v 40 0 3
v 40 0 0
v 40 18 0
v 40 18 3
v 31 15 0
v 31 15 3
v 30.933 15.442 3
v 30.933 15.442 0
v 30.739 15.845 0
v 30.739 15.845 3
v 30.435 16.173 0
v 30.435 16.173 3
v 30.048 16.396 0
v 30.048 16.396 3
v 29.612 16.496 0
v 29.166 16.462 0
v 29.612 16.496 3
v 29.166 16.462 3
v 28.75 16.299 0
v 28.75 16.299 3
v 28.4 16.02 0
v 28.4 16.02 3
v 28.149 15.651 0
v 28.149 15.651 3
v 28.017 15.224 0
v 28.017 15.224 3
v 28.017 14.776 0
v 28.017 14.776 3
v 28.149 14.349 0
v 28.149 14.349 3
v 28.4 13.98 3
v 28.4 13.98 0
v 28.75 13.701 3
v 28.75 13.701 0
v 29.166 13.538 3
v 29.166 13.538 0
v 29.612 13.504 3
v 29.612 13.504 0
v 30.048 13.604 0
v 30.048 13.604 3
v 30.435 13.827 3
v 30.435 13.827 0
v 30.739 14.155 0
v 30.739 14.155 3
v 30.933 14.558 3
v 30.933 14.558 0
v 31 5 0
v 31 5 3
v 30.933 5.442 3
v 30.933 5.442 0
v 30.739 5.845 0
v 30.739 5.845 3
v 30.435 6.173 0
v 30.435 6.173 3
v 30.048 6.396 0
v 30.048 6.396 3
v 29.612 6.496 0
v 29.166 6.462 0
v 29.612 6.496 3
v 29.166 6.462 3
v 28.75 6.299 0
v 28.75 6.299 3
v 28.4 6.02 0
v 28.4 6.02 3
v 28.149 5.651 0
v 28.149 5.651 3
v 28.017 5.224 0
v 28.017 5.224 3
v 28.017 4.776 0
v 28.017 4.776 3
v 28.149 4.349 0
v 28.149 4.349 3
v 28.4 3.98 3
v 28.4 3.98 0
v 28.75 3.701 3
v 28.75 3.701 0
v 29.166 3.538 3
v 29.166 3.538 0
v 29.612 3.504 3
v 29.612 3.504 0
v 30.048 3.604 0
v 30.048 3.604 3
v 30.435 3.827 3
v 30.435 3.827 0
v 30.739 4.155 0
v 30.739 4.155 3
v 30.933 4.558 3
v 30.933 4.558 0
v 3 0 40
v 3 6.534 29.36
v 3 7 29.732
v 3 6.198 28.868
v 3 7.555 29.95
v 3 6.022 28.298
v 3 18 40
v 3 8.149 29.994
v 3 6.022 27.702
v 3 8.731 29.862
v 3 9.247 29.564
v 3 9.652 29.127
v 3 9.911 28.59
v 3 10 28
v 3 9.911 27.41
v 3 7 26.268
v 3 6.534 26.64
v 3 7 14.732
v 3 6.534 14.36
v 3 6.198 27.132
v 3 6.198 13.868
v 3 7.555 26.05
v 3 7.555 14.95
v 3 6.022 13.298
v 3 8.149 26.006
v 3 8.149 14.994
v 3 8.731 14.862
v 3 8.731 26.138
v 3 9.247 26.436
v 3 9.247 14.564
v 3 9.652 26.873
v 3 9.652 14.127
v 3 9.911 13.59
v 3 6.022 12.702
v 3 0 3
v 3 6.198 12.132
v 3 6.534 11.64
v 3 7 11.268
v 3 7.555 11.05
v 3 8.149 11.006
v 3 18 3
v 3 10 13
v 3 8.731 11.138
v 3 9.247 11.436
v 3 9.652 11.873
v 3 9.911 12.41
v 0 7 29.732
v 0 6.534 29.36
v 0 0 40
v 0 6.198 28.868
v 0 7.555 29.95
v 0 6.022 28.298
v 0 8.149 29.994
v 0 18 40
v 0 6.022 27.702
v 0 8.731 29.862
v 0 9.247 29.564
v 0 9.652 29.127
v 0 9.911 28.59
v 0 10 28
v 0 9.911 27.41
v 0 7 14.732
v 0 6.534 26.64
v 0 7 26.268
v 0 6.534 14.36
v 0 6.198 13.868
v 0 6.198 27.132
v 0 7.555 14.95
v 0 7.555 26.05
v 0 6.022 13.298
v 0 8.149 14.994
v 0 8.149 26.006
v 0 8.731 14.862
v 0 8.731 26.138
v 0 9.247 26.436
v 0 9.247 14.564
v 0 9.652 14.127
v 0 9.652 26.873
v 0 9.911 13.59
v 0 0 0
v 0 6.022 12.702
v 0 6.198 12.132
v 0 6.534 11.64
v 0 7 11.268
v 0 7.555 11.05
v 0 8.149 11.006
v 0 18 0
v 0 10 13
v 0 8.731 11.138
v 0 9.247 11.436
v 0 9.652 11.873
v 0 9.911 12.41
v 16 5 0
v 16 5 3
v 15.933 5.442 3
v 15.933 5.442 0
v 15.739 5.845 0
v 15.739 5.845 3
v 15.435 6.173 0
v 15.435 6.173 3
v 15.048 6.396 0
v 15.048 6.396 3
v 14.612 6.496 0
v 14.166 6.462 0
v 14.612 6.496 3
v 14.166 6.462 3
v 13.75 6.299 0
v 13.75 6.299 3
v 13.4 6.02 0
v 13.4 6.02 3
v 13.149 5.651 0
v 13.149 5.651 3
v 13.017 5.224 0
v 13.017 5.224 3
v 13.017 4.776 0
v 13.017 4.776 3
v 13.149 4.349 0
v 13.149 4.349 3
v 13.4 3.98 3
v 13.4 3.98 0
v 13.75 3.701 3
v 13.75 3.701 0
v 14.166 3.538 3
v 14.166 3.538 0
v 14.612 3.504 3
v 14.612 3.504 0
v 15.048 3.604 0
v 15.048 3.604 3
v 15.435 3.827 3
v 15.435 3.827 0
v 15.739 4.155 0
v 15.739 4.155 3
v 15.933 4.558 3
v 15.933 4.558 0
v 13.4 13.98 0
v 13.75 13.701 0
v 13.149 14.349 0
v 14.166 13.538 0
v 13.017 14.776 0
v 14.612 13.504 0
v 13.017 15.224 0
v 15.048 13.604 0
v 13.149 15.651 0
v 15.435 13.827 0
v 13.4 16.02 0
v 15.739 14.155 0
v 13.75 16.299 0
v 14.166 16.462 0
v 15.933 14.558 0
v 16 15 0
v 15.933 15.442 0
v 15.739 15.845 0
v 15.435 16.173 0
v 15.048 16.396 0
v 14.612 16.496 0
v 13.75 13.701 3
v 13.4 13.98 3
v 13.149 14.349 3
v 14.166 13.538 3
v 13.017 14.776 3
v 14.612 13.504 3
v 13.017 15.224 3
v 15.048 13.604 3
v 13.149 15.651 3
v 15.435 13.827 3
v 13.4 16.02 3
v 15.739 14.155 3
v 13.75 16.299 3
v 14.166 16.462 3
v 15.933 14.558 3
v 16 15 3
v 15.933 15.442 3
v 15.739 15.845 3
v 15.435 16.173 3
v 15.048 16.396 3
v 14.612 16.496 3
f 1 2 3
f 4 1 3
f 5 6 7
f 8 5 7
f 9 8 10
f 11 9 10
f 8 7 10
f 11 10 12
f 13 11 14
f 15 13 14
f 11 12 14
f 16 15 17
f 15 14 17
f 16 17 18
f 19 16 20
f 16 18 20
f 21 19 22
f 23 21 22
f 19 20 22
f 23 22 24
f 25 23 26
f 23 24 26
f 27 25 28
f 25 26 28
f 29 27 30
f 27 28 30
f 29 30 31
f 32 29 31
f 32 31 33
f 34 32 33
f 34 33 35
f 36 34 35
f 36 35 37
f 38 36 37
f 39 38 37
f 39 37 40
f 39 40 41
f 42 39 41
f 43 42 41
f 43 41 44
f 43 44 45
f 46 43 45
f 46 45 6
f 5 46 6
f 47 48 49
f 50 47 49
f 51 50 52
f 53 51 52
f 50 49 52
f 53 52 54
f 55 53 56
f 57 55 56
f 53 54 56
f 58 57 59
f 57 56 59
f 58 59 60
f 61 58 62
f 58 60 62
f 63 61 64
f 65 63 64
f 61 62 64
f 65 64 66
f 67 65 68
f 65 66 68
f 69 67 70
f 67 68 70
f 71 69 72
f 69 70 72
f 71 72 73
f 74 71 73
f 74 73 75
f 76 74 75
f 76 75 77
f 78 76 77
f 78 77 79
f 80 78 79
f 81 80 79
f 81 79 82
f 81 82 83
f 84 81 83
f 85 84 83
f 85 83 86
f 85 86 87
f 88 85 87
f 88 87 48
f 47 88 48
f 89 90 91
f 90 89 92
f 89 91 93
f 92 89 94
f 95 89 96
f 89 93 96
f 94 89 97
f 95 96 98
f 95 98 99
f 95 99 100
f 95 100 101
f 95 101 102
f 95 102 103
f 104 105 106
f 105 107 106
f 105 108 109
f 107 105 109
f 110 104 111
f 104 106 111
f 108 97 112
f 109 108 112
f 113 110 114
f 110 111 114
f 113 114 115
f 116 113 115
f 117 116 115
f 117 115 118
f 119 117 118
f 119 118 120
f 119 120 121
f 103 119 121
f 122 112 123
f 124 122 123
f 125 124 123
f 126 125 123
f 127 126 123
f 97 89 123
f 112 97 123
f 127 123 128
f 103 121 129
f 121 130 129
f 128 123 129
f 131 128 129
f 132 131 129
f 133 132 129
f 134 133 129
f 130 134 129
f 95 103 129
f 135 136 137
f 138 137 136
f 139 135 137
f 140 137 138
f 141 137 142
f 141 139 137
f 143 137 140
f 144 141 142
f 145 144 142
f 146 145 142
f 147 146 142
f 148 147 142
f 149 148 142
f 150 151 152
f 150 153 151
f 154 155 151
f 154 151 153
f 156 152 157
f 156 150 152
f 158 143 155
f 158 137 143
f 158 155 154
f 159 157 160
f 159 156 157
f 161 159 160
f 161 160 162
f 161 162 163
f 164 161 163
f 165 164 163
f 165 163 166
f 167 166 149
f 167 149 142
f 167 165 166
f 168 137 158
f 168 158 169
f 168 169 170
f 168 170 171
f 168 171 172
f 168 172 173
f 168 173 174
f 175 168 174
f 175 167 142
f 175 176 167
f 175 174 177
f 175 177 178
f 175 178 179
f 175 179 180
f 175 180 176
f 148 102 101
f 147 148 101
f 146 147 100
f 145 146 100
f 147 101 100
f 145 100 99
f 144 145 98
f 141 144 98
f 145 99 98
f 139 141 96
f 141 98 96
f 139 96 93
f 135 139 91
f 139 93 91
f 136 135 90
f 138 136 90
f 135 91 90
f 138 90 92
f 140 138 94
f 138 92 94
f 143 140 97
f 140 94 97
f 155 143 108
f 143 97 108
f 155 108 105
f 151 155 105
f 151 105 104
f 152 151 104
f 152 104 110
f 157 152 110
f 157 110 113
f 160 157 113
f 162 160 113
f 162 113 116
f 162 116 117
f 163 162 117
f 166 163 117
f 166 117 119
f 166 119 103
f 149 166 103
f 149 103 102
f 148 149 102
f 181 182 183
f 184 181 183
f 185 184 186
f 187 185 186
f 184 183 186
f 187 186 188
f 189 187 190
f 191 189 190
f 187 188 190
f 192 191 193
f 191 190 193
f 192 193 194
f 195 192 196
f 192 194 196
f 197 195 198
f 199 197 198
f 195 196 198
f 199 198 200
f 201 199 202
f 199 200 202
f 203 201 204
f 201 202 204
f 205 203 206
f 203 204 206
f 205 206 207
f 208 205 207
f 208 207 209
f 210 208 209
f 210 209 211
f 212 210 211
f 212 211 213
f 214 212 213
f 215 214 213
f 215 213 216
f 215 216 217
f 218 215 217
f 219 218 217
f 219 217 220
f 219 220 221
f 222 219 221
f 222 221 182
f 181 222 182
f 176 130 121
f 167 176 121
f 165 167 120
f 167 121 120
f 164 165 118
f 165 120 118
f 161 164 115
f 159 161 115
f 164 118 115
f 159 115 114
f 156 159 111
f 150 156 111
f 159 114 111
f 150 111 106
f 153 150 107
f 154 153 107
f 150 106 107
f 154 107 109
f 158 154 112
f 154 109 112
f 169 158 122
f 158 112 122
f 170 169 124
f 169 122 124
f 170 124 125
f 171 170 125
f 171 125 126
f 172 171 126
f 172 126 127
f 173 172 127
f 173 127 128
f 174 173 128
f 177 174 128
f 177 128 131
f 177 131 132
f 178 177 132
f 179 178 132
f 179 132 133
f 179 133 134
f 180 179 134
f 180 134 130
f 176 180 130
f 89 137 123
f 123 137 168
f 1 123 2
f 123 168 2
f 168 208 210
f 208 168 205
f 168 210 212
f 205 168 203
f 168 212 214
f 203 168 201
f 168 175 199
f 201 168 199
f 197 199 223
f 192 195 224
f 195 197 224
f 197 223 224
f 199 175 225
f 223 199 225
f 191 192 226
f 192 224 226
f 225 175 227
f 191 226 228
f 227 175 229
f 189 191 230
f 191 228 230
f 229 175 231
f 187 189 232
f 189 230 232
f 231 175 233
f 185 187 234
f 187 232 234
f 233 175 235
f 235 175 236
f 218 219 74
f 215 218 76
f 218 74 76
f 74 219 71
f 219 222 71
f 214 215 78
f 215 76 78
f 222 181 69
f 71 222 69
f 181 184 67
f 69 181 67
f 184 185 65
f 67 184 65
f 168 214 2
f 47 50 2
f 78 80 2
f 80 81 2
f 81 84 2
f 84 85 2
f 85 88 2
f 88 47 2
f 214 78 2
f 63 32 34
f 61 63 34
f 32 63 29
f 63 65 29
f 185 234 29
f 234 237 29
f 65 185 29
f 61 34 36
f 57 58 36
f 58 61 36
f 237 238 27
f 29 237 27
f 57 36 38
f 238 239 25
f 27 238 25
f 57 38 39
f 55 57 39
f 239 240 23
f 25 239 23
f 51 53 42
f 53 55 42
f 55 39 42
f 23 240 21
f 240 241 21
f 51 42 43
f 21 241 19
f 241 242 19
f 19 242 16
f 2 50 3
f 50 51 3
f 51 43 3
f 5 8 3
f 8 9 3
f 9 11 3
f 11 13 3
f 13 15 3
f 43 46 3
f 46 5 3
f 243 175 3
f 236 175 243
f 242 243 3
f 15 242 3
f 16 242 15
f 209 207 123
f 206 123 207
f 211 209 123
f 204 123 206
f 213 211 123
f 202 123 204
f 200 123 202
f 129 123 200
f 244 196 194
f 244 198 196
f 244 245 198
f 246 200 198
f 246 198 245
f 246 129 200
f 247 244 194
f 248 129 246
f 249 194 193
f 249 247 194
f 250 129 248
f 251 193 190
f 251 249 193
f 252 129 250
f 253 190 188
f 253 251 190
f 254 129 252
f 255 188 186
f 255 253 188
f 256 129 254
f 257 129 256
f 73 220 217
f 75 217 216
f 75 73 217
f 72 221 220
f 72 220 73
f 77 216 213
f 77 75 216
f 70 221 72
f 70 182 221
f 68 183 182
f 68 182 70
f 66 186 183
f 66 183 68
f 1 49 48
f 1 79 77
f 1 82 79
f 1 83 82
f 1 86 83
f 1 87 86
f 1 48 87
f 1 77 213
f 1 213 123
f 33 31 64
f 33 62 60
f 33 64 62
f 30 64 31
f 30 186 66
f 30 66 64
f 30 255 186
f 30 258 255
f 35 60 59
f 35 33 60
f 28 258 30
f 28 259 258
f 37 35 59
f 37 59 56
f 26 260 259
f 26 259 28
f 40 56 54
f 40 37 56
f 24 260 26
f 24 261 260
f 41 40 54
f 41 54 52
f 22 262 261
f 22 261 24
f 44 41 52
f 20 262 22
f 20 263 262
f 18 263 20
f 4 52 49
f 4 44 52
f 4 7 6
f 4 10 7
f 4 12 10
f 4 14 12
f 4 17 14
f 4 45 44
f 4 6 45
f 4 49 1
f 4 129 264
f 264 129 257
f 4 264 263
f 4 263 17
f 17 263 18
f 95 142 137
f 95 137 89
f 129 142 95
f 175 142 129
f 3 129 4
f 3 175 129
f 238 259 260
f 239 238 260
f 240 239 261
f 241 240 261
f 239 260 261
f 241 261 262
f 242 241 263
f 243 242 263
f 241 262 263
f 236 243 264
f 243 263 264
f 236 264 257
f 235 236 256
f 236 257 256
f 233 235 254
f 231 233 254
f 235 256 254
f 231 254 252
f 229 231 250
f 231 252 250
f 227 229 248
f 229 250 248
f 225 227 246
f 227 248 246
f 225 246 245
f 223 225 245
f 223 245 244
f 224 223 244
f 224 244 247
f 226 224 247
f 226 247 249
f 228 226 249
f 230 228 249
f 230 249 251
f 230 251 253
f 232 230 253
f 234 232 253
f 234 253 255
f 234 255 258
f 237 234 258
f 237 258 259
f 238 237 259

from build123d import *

# Parameters (mm, degrees)
ESQUISSE1_W             = 40
ESQUISSE1_H             = 18
BOSS_EXTRU_1_DEPTH      = 3
ESQUISSE2_W             = 3
ESQUISSE2_H             = 18
BOSS_EXTRU_2_DEPTH      = 37
ESQUISSE3_R             = 1.5
ENL_V_MAT_EXTRU_1_DEPTH = 58.384666942
ESQUISSE4_R             = 2
ENL_V_MAT_EXTRU_2_DEPTH = 58.384666942


with BuildPart() as part:
    # Esquisse1 → Boss.-Extru.1 (new body)
    with BuildSketch(Plane.XY):
        with Locations((20, 9)):
            Rectangle(ESQUISSE1_W, ESQUISSE1_H)
    extrude(amount=BOSS_EXTRU_1_DEPTH)

    # Esquisse2 → Boss.-Extru.2 (add)
    with BuildSketch(Plane.XY.offset(3)):
        with Locations((1.5, 9)):
            Rectangle(ESQUISSE2_W, ESQUISSE2_H)
    extrude(amount=BOSS_EXTRU_2_DEPTH)

    # Esquisse3 → Enlèv. mat.-Extru.1 (cut, through all)
    with BuildSketch(Plane.XY.offset(3)):
        with Locations((14.5, 15)):
            Circle(ESQUISSE3_R)
        with Locations((29.5, 15)):
            Circle(ESQUISSE3_R)
        with Locations((14.5, 5)):
            Circle(ESQUISSE3_R)
        with Locations((29.5, 5)):
            Circle(ESQUISSE3_R)
    extrude(amount=-ENL_V_MAT_EXTRU_1_DEPTH, mode=Mode.SUBTRACT)

    # Esquisse4 → Enlèv. mat.-Extru.2 (cut, through all)
    with BuildSketch(Plane(origin=(3, 0, 0), x_dir=(0, 0, -1), z_dir=(1, 0, 0))):
        with Locations(Location((-28, 8, 0), (0, 0, 90))):
            Circle(ESQUISSE4_R)
        with Locations(Location((-13, 8, 0), (0, 0, 90))):
            Circle(ESQUISSE4_R)
    extrude(amount=-ENL_V_MAT_EXTRU_2_DEPTH, mode=Mode.SUBTRACT)


solid = part.part
